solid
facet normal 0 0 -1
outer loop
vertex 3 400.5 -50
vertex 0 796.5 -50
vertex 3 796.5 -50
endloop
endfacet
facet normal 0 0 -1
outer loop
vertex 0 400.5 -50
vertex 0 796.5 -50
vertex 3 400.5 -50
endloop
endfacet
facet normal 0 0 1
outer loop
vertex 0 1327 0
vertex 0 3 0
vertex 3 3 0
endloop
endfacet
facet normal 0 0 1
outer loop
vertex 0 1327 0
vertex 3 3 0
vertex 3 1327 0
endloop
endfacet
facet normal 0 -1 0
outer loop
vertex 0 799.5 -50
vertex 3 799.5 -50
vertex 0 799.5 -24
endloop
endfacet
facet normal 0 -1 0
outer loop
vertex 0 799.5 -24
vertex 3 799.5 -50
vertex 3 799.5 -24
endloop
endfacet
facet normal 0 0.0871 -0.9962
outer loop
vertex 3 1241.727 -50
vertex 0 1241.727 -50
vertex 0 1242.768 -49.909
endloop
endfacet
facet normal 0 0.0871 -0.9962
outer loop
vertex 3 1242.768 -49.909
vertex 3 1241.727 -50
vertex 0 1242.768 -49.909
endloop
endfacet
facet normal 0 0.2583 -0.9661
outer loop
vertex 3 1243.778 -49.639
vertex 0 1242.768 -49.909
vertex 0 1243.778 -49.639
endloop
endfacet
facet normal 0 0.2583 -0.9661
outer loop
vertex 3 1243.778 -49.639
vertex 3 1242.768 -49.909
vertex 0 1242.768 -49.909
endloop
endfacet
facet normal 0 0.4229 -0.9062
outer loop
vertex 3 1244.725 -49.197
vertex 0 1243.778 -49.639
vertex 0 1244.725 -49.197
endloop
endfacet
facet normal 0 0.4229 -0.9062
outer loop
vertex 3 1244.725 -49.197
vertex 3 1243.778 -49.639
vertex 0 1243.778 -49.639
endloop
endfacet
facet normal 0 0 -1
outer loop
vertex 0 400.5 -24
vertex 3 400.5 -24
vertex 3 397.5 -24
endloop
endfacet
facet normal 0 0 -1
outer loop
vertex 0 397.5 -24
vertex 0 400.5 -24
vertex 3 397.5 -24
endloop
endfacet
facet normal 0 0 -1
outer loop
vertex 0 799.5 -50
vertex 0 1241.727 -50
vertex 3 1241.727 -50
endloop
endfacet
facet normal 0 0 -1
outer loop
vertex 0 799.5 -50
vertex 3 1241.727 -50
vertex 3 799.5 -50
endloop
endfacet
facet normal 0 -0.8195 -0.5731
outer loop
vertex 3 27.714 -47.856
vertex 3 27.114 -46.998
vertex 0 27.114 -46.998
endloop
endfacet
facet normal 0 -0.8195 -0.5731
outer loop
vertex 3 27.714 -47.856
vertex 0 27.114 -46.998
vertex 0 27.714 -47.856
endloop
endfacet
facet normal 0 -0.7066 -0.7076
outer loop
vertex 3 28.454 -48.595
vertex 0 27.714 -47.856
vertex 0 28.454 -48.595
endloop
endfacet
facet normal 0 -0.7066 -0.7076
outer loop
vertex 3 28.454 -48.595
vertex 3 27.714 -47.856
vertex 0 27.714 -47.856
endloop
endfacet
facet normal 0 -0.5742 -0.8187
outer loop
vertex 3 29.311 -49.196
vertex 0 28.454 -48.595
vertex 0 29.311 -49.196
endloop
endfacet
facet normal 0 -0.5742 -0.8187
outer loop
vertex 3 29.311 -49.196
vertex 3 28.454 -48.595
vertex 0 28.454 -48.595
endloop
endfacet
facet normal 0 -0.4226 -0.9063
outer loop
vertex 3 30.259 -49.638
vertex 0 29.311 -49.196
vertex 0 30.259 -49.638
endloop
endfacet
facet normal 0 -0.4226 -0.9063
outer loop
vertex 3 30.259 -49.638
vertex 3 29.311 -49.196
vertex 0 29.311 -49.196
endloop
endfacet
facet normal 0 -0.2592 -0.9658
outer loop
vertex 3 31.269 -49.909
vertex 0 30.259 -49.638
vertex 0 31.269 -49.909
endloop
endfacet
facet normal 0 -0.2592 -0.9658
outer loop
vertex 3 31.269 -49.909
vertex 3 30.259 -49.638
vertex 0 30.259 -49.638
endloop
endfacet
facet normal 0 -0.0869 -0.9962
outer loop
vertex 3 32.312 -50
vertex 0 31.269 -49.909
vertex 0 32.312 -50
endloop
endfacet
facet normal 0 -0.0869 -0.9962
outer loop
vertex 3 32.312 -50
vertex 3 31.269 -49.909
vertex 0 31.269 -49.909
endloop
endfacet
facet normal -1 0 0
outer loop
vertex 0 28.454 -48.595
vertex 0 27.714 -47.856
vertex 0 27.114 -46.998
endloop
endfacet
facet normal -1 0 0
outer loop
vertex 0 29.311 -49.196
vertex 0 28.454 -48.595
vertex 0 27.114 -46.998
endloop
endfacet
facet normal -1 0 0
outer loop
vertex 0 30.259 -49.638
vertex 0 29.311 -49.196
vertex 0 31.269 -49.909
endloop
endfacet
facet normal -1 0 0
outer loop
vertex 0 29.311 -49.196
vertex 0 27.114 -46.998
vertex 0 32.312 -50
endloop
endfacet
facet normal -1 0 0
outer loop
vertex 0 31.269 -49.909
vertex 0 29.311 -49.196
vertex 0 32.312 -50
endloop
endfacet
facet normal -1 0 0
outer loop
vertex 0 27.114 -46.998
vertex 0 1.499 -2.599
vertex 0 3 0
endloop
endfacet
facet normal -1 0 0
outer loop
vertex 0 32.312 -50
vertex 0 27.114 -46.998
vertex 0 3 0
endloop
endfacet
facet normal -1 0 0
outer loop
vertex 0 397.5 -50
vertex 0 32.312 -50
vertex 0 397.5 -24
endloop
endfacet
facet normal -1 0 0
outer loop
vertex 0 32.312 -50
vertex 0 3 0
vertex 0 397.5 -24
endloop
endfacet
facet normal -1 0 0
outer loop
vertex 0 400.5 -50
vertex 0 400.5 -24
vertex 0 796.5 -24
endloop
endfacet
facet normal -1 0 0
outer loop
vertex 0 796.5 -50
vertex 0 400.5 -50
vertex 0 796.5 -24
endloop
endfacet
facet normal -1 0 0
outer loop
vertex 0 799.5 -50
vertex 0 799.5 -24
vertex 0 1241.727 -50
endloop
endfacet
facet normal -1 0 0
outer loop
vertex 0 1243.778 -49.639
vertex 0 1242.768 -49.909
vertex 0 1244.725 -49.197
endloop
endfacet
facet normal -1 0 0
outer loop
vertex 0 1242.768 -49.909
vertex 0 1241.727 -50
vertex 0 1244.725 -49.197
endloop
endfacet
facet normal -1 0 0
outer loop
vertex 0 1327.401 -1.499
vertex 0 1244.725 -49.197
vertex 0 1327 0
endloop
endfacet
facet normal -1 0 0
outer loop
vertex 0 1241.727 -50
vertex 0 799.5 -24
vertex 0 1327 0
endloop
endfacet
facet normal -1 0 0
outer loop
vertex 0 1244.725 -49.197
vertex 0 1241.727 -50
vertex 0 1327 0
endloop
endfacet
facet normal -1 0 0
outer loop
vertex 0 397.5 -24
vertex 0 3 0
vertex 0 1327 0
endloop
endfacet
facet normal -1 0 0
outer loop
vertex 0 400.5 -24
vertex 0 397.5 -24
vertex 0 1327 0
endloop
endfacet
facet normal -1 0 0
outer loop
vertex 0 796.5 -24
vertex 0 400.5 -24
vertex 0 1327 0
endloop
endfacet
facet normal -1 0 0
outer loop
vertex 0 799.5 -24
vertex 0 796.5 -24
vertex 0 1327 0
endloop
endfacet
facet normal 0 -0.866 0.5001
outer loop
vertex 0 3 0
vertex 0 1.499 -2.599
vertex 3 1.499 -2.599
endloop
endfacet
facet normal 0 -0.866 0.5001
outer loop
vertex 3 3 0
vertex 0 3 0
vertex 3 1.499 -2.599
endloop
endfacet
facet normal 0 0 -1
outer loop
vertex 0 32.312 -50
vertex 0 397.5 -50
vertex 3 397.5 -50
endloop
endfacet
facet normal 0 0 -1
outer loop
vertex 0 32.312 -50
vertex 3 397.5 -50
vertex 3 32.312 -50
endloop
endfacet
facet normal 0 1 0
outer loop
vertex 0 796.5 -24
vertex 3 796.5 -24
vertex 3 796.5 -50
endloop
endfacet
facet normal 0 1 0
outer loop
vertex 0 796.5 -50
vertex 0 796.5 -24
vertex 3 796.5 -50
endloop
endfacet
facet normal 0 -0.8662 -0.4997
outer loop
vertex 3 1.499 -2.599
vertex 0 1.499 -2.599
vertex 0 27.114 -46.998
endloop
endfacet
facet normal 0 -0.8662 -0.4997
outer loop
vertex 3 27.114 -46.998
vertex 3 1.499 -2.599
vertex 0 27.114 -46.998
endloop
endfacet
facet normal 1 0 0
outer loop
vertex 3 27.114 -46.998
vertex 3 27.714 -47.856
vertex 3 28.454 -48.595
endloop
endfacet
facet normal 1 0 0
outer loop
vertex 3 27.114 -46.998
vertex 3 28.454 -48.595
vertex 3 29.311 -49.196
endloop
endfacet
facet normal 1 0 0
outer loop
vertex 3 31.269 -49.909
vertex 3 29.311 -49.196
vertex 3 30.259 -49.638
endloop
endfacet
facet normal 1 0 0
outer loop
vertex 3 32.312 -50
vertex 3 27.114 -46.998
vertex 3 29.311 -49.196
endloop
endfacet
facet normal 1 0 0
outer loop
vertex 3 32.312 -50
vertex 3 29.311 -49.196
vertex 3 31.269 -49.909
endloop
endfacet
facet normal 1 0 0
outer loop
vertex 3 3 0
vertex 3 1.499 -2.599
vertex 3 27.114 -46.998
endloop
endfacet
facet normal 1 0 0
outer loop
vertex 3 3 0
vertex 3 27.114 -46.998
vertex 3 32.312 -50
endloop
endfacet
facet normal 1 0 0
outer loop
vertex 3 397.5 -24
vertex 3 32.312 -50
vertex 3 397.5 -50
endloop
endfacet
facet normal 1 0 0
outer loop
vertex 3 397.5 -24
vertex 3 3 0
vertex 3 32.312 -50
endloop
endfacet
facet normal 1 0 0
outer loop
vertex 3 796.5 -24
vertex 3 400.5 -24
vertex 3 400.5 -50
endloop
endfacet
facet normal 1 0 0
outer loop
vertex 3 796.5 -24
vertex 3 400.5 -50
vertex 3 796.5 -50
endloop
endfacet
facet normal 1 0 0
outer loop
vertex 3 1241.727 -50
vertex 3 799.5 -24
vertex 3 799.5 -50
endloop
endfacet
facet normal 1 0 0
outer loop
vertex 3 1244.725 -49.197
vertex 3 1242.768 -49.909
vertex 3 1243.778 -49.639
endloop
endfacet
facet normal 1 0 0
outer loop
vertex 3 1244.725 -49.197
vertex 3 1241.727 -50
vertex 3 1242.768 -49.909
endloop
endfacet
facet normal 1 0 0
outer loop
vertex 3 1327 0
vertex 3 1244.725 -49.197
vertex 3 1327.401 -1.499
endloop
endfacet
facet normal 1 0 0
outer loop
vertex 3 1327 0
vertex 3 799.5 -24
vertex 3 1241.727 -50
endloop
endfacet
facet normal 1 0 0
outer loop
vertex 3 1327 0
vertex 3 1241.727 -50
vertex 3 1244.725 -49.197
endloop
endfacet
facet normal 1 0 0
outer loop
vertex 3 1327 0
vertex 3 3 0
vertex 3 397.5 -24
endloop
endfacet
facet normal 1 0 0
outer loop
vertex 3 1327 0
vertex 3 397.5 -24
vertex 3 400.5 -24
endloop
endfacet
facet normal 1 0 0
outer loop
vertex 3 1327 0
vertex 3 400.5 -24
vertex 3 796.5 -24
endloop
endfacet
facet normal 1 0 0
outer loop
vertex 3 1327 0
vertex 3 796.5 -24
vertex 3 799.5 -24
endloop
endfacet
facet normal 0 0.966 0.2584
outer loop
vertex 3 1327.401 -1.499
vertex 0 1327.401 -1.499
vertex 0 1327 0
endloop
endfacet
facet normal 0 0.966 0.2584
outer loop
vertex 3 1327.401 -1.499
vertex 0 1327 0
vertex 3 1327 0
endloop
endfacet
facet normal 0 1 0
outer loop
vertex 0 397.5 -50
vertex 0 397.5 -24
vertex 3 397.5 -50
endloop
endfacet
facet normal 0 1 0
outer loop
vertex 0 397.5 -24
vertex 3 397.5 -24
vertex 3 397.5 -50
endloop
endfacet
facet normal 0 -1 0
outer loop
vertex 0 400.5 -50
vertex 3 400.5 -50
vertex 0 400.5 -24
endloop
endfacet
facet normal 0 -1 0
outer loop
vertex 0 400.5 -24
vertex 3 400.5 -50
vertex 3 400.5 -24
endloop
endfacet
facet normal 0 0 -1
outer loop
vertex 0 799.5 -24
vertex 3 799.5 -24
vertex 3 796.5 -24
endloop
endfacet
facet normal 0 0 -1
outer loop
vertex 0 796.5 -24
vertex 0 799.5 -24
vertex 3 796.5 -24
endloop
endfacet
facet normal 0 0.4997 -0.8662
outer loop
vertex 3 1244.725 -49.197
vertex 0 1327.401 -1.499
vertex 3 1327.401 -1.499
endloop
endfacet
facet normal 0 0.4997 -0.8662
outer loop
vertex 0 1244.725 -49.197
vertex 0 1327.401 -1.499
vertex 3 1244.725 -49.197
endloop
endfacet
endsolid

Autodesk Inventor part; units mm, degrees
ref_plane "YZ Plane" through (0, 0, 0) normal (1, 0, 0) x (0, 1, 0)
ref_plane "XZ Plane" through (0, 0, 0) normal (0, 1, 0) x (-1, 0, 0)
ref_plane "XY Plane" through (0, 0, 0) normal (0, 0, 1) x (1, 0, 0)
sketch "Sketch2" plane through (0, 0, 0) normal (1, 0, 0) x (0, 1, 0)
  line L0 (0, 0) -> (1330, 0)
  line L1 (1330, 0) -> (1330, -50)
  line L2 (1330, -50) -> (0, -50)
  line L3 (0, -50) -> (0, 0)
  line L4 (1330, -50) -> (1293.2713, 0) construction
  line L5 (1330, 0) -> (1243.3333, -50)
  line L6 (0, 0) -> (28.8462, -50)
  dimension "d28" = 1330
  dimension "d29" = 50
  dimension "d31" = 36.3
  dimension "d32" = 60.018
  dimension "d36" = 60.018
extrude "Plate2" add sketch "Sketch2" along normal blind 3 contours L0 L5 L2 L6
chamfer "Corner Chamfer1" distance 3 angle 45 2 edges at (1.5, 1330, 0) (1.5, 0, 0)
fillet "Corner Round1" radius 6 2 edges at (1.5, 28.8462, -50) (1.5, 1243.3333, -50)
sketch "Sketch3" plane through (3, 0, 0) normal (1, 0, 0) x (0, 0, -1)
  line L0 (24, 397.5) -> (50, 397.5)
  line L1 (50, 397.5) -> (50, 400.5)
  line L2 (50, 400.5) -> (24, 400.5)
  line L3 (24, 400.5) -> (24, 397.5)
  line L4 (50, 1241.7267) -> (50, 32.3115) projected
  line L5 (50, 399) -> (0, 399) construction
  line L6 (0, 3) -> (0, 1327) projected
  line L7 (50, 798) -> (0, 798) construction
  line L8 (24, 796.5) -> (50, 796.5)
  line L9 (50, 796.5) -> (50, 799.5)
  line L10 (50, 799.5) -> (24, 799.5)
  line L11 (24, 799.5) -> (24, 796.5)
  point P0 (0, 0)
  point P1 (50, 796.5)
  point P2 (50, 799.5)
  dimension "d39" = 26
  dimension "d40" = 3
  dimension "d41" = 399
  dimension "d42" = 798
  dimension "d43" = 3
  dimension "d44" = 26
extrude "Extrusion1" cut sketch "Sketch3" against normal through all
sketch "Sketch4" plane through (3, 0, 0) normal (1, 0, 0) x (0, 0, -1)
  line L0 (15.0943, 691.214) -> (35.8481, 691.214) construction
  line L1 (35.8481, 691.214) -> (35.8481, 467.4424) construction
  line L2 (35.8481, 467.4424) -> (15.0943, 467.4424) construction
  line L3 (15.0943, 467.4424) -> (15.0943, 691.214) construction
  point P0 (0, 0)
mark "Mark1"
equation "\"d41\" = 0.3 * Конус_длина_борт"
equation "\"d42\" = 0.6 * Конус_длина_борт"
equation "\"d28\" = Конус_длина_борт"
equation "\"d32\" = Конус_Угол_борт"
equation "\"d36\" = Конус_Угол_борт"
equation "\"d40\" = Thickness"
equation "\"d43\" = Thickness"
equation "\"d44\" = d39"
equation "\"d30\" = Thickness"
equation "\"GapSize\" = Thickness"
equation "\"MinimumRemnant\" = 2 * Thickness"
equation "\"BendReliefDepth\" = 0.5 * Thickness"
equation "\"BendReliefWidth\" = Thickness"
equation "\"CornerReliefSize\" = 4 * Thickness"
equation "\"JacobiRadiusSize\" = BendRadius"
equation "\"TransitionRadius\" = BendRadius"
equation "\"Конус_длина_борт\" = 1330"
equation "\"Конус_Угол_борт\" = 60.018361deg"
equation "\"Thickness\" = 3"
equation "\"BendRadius\" = 5"
properties part number "MSC 110 STRINGER CONE" material "Stainless Steel"
